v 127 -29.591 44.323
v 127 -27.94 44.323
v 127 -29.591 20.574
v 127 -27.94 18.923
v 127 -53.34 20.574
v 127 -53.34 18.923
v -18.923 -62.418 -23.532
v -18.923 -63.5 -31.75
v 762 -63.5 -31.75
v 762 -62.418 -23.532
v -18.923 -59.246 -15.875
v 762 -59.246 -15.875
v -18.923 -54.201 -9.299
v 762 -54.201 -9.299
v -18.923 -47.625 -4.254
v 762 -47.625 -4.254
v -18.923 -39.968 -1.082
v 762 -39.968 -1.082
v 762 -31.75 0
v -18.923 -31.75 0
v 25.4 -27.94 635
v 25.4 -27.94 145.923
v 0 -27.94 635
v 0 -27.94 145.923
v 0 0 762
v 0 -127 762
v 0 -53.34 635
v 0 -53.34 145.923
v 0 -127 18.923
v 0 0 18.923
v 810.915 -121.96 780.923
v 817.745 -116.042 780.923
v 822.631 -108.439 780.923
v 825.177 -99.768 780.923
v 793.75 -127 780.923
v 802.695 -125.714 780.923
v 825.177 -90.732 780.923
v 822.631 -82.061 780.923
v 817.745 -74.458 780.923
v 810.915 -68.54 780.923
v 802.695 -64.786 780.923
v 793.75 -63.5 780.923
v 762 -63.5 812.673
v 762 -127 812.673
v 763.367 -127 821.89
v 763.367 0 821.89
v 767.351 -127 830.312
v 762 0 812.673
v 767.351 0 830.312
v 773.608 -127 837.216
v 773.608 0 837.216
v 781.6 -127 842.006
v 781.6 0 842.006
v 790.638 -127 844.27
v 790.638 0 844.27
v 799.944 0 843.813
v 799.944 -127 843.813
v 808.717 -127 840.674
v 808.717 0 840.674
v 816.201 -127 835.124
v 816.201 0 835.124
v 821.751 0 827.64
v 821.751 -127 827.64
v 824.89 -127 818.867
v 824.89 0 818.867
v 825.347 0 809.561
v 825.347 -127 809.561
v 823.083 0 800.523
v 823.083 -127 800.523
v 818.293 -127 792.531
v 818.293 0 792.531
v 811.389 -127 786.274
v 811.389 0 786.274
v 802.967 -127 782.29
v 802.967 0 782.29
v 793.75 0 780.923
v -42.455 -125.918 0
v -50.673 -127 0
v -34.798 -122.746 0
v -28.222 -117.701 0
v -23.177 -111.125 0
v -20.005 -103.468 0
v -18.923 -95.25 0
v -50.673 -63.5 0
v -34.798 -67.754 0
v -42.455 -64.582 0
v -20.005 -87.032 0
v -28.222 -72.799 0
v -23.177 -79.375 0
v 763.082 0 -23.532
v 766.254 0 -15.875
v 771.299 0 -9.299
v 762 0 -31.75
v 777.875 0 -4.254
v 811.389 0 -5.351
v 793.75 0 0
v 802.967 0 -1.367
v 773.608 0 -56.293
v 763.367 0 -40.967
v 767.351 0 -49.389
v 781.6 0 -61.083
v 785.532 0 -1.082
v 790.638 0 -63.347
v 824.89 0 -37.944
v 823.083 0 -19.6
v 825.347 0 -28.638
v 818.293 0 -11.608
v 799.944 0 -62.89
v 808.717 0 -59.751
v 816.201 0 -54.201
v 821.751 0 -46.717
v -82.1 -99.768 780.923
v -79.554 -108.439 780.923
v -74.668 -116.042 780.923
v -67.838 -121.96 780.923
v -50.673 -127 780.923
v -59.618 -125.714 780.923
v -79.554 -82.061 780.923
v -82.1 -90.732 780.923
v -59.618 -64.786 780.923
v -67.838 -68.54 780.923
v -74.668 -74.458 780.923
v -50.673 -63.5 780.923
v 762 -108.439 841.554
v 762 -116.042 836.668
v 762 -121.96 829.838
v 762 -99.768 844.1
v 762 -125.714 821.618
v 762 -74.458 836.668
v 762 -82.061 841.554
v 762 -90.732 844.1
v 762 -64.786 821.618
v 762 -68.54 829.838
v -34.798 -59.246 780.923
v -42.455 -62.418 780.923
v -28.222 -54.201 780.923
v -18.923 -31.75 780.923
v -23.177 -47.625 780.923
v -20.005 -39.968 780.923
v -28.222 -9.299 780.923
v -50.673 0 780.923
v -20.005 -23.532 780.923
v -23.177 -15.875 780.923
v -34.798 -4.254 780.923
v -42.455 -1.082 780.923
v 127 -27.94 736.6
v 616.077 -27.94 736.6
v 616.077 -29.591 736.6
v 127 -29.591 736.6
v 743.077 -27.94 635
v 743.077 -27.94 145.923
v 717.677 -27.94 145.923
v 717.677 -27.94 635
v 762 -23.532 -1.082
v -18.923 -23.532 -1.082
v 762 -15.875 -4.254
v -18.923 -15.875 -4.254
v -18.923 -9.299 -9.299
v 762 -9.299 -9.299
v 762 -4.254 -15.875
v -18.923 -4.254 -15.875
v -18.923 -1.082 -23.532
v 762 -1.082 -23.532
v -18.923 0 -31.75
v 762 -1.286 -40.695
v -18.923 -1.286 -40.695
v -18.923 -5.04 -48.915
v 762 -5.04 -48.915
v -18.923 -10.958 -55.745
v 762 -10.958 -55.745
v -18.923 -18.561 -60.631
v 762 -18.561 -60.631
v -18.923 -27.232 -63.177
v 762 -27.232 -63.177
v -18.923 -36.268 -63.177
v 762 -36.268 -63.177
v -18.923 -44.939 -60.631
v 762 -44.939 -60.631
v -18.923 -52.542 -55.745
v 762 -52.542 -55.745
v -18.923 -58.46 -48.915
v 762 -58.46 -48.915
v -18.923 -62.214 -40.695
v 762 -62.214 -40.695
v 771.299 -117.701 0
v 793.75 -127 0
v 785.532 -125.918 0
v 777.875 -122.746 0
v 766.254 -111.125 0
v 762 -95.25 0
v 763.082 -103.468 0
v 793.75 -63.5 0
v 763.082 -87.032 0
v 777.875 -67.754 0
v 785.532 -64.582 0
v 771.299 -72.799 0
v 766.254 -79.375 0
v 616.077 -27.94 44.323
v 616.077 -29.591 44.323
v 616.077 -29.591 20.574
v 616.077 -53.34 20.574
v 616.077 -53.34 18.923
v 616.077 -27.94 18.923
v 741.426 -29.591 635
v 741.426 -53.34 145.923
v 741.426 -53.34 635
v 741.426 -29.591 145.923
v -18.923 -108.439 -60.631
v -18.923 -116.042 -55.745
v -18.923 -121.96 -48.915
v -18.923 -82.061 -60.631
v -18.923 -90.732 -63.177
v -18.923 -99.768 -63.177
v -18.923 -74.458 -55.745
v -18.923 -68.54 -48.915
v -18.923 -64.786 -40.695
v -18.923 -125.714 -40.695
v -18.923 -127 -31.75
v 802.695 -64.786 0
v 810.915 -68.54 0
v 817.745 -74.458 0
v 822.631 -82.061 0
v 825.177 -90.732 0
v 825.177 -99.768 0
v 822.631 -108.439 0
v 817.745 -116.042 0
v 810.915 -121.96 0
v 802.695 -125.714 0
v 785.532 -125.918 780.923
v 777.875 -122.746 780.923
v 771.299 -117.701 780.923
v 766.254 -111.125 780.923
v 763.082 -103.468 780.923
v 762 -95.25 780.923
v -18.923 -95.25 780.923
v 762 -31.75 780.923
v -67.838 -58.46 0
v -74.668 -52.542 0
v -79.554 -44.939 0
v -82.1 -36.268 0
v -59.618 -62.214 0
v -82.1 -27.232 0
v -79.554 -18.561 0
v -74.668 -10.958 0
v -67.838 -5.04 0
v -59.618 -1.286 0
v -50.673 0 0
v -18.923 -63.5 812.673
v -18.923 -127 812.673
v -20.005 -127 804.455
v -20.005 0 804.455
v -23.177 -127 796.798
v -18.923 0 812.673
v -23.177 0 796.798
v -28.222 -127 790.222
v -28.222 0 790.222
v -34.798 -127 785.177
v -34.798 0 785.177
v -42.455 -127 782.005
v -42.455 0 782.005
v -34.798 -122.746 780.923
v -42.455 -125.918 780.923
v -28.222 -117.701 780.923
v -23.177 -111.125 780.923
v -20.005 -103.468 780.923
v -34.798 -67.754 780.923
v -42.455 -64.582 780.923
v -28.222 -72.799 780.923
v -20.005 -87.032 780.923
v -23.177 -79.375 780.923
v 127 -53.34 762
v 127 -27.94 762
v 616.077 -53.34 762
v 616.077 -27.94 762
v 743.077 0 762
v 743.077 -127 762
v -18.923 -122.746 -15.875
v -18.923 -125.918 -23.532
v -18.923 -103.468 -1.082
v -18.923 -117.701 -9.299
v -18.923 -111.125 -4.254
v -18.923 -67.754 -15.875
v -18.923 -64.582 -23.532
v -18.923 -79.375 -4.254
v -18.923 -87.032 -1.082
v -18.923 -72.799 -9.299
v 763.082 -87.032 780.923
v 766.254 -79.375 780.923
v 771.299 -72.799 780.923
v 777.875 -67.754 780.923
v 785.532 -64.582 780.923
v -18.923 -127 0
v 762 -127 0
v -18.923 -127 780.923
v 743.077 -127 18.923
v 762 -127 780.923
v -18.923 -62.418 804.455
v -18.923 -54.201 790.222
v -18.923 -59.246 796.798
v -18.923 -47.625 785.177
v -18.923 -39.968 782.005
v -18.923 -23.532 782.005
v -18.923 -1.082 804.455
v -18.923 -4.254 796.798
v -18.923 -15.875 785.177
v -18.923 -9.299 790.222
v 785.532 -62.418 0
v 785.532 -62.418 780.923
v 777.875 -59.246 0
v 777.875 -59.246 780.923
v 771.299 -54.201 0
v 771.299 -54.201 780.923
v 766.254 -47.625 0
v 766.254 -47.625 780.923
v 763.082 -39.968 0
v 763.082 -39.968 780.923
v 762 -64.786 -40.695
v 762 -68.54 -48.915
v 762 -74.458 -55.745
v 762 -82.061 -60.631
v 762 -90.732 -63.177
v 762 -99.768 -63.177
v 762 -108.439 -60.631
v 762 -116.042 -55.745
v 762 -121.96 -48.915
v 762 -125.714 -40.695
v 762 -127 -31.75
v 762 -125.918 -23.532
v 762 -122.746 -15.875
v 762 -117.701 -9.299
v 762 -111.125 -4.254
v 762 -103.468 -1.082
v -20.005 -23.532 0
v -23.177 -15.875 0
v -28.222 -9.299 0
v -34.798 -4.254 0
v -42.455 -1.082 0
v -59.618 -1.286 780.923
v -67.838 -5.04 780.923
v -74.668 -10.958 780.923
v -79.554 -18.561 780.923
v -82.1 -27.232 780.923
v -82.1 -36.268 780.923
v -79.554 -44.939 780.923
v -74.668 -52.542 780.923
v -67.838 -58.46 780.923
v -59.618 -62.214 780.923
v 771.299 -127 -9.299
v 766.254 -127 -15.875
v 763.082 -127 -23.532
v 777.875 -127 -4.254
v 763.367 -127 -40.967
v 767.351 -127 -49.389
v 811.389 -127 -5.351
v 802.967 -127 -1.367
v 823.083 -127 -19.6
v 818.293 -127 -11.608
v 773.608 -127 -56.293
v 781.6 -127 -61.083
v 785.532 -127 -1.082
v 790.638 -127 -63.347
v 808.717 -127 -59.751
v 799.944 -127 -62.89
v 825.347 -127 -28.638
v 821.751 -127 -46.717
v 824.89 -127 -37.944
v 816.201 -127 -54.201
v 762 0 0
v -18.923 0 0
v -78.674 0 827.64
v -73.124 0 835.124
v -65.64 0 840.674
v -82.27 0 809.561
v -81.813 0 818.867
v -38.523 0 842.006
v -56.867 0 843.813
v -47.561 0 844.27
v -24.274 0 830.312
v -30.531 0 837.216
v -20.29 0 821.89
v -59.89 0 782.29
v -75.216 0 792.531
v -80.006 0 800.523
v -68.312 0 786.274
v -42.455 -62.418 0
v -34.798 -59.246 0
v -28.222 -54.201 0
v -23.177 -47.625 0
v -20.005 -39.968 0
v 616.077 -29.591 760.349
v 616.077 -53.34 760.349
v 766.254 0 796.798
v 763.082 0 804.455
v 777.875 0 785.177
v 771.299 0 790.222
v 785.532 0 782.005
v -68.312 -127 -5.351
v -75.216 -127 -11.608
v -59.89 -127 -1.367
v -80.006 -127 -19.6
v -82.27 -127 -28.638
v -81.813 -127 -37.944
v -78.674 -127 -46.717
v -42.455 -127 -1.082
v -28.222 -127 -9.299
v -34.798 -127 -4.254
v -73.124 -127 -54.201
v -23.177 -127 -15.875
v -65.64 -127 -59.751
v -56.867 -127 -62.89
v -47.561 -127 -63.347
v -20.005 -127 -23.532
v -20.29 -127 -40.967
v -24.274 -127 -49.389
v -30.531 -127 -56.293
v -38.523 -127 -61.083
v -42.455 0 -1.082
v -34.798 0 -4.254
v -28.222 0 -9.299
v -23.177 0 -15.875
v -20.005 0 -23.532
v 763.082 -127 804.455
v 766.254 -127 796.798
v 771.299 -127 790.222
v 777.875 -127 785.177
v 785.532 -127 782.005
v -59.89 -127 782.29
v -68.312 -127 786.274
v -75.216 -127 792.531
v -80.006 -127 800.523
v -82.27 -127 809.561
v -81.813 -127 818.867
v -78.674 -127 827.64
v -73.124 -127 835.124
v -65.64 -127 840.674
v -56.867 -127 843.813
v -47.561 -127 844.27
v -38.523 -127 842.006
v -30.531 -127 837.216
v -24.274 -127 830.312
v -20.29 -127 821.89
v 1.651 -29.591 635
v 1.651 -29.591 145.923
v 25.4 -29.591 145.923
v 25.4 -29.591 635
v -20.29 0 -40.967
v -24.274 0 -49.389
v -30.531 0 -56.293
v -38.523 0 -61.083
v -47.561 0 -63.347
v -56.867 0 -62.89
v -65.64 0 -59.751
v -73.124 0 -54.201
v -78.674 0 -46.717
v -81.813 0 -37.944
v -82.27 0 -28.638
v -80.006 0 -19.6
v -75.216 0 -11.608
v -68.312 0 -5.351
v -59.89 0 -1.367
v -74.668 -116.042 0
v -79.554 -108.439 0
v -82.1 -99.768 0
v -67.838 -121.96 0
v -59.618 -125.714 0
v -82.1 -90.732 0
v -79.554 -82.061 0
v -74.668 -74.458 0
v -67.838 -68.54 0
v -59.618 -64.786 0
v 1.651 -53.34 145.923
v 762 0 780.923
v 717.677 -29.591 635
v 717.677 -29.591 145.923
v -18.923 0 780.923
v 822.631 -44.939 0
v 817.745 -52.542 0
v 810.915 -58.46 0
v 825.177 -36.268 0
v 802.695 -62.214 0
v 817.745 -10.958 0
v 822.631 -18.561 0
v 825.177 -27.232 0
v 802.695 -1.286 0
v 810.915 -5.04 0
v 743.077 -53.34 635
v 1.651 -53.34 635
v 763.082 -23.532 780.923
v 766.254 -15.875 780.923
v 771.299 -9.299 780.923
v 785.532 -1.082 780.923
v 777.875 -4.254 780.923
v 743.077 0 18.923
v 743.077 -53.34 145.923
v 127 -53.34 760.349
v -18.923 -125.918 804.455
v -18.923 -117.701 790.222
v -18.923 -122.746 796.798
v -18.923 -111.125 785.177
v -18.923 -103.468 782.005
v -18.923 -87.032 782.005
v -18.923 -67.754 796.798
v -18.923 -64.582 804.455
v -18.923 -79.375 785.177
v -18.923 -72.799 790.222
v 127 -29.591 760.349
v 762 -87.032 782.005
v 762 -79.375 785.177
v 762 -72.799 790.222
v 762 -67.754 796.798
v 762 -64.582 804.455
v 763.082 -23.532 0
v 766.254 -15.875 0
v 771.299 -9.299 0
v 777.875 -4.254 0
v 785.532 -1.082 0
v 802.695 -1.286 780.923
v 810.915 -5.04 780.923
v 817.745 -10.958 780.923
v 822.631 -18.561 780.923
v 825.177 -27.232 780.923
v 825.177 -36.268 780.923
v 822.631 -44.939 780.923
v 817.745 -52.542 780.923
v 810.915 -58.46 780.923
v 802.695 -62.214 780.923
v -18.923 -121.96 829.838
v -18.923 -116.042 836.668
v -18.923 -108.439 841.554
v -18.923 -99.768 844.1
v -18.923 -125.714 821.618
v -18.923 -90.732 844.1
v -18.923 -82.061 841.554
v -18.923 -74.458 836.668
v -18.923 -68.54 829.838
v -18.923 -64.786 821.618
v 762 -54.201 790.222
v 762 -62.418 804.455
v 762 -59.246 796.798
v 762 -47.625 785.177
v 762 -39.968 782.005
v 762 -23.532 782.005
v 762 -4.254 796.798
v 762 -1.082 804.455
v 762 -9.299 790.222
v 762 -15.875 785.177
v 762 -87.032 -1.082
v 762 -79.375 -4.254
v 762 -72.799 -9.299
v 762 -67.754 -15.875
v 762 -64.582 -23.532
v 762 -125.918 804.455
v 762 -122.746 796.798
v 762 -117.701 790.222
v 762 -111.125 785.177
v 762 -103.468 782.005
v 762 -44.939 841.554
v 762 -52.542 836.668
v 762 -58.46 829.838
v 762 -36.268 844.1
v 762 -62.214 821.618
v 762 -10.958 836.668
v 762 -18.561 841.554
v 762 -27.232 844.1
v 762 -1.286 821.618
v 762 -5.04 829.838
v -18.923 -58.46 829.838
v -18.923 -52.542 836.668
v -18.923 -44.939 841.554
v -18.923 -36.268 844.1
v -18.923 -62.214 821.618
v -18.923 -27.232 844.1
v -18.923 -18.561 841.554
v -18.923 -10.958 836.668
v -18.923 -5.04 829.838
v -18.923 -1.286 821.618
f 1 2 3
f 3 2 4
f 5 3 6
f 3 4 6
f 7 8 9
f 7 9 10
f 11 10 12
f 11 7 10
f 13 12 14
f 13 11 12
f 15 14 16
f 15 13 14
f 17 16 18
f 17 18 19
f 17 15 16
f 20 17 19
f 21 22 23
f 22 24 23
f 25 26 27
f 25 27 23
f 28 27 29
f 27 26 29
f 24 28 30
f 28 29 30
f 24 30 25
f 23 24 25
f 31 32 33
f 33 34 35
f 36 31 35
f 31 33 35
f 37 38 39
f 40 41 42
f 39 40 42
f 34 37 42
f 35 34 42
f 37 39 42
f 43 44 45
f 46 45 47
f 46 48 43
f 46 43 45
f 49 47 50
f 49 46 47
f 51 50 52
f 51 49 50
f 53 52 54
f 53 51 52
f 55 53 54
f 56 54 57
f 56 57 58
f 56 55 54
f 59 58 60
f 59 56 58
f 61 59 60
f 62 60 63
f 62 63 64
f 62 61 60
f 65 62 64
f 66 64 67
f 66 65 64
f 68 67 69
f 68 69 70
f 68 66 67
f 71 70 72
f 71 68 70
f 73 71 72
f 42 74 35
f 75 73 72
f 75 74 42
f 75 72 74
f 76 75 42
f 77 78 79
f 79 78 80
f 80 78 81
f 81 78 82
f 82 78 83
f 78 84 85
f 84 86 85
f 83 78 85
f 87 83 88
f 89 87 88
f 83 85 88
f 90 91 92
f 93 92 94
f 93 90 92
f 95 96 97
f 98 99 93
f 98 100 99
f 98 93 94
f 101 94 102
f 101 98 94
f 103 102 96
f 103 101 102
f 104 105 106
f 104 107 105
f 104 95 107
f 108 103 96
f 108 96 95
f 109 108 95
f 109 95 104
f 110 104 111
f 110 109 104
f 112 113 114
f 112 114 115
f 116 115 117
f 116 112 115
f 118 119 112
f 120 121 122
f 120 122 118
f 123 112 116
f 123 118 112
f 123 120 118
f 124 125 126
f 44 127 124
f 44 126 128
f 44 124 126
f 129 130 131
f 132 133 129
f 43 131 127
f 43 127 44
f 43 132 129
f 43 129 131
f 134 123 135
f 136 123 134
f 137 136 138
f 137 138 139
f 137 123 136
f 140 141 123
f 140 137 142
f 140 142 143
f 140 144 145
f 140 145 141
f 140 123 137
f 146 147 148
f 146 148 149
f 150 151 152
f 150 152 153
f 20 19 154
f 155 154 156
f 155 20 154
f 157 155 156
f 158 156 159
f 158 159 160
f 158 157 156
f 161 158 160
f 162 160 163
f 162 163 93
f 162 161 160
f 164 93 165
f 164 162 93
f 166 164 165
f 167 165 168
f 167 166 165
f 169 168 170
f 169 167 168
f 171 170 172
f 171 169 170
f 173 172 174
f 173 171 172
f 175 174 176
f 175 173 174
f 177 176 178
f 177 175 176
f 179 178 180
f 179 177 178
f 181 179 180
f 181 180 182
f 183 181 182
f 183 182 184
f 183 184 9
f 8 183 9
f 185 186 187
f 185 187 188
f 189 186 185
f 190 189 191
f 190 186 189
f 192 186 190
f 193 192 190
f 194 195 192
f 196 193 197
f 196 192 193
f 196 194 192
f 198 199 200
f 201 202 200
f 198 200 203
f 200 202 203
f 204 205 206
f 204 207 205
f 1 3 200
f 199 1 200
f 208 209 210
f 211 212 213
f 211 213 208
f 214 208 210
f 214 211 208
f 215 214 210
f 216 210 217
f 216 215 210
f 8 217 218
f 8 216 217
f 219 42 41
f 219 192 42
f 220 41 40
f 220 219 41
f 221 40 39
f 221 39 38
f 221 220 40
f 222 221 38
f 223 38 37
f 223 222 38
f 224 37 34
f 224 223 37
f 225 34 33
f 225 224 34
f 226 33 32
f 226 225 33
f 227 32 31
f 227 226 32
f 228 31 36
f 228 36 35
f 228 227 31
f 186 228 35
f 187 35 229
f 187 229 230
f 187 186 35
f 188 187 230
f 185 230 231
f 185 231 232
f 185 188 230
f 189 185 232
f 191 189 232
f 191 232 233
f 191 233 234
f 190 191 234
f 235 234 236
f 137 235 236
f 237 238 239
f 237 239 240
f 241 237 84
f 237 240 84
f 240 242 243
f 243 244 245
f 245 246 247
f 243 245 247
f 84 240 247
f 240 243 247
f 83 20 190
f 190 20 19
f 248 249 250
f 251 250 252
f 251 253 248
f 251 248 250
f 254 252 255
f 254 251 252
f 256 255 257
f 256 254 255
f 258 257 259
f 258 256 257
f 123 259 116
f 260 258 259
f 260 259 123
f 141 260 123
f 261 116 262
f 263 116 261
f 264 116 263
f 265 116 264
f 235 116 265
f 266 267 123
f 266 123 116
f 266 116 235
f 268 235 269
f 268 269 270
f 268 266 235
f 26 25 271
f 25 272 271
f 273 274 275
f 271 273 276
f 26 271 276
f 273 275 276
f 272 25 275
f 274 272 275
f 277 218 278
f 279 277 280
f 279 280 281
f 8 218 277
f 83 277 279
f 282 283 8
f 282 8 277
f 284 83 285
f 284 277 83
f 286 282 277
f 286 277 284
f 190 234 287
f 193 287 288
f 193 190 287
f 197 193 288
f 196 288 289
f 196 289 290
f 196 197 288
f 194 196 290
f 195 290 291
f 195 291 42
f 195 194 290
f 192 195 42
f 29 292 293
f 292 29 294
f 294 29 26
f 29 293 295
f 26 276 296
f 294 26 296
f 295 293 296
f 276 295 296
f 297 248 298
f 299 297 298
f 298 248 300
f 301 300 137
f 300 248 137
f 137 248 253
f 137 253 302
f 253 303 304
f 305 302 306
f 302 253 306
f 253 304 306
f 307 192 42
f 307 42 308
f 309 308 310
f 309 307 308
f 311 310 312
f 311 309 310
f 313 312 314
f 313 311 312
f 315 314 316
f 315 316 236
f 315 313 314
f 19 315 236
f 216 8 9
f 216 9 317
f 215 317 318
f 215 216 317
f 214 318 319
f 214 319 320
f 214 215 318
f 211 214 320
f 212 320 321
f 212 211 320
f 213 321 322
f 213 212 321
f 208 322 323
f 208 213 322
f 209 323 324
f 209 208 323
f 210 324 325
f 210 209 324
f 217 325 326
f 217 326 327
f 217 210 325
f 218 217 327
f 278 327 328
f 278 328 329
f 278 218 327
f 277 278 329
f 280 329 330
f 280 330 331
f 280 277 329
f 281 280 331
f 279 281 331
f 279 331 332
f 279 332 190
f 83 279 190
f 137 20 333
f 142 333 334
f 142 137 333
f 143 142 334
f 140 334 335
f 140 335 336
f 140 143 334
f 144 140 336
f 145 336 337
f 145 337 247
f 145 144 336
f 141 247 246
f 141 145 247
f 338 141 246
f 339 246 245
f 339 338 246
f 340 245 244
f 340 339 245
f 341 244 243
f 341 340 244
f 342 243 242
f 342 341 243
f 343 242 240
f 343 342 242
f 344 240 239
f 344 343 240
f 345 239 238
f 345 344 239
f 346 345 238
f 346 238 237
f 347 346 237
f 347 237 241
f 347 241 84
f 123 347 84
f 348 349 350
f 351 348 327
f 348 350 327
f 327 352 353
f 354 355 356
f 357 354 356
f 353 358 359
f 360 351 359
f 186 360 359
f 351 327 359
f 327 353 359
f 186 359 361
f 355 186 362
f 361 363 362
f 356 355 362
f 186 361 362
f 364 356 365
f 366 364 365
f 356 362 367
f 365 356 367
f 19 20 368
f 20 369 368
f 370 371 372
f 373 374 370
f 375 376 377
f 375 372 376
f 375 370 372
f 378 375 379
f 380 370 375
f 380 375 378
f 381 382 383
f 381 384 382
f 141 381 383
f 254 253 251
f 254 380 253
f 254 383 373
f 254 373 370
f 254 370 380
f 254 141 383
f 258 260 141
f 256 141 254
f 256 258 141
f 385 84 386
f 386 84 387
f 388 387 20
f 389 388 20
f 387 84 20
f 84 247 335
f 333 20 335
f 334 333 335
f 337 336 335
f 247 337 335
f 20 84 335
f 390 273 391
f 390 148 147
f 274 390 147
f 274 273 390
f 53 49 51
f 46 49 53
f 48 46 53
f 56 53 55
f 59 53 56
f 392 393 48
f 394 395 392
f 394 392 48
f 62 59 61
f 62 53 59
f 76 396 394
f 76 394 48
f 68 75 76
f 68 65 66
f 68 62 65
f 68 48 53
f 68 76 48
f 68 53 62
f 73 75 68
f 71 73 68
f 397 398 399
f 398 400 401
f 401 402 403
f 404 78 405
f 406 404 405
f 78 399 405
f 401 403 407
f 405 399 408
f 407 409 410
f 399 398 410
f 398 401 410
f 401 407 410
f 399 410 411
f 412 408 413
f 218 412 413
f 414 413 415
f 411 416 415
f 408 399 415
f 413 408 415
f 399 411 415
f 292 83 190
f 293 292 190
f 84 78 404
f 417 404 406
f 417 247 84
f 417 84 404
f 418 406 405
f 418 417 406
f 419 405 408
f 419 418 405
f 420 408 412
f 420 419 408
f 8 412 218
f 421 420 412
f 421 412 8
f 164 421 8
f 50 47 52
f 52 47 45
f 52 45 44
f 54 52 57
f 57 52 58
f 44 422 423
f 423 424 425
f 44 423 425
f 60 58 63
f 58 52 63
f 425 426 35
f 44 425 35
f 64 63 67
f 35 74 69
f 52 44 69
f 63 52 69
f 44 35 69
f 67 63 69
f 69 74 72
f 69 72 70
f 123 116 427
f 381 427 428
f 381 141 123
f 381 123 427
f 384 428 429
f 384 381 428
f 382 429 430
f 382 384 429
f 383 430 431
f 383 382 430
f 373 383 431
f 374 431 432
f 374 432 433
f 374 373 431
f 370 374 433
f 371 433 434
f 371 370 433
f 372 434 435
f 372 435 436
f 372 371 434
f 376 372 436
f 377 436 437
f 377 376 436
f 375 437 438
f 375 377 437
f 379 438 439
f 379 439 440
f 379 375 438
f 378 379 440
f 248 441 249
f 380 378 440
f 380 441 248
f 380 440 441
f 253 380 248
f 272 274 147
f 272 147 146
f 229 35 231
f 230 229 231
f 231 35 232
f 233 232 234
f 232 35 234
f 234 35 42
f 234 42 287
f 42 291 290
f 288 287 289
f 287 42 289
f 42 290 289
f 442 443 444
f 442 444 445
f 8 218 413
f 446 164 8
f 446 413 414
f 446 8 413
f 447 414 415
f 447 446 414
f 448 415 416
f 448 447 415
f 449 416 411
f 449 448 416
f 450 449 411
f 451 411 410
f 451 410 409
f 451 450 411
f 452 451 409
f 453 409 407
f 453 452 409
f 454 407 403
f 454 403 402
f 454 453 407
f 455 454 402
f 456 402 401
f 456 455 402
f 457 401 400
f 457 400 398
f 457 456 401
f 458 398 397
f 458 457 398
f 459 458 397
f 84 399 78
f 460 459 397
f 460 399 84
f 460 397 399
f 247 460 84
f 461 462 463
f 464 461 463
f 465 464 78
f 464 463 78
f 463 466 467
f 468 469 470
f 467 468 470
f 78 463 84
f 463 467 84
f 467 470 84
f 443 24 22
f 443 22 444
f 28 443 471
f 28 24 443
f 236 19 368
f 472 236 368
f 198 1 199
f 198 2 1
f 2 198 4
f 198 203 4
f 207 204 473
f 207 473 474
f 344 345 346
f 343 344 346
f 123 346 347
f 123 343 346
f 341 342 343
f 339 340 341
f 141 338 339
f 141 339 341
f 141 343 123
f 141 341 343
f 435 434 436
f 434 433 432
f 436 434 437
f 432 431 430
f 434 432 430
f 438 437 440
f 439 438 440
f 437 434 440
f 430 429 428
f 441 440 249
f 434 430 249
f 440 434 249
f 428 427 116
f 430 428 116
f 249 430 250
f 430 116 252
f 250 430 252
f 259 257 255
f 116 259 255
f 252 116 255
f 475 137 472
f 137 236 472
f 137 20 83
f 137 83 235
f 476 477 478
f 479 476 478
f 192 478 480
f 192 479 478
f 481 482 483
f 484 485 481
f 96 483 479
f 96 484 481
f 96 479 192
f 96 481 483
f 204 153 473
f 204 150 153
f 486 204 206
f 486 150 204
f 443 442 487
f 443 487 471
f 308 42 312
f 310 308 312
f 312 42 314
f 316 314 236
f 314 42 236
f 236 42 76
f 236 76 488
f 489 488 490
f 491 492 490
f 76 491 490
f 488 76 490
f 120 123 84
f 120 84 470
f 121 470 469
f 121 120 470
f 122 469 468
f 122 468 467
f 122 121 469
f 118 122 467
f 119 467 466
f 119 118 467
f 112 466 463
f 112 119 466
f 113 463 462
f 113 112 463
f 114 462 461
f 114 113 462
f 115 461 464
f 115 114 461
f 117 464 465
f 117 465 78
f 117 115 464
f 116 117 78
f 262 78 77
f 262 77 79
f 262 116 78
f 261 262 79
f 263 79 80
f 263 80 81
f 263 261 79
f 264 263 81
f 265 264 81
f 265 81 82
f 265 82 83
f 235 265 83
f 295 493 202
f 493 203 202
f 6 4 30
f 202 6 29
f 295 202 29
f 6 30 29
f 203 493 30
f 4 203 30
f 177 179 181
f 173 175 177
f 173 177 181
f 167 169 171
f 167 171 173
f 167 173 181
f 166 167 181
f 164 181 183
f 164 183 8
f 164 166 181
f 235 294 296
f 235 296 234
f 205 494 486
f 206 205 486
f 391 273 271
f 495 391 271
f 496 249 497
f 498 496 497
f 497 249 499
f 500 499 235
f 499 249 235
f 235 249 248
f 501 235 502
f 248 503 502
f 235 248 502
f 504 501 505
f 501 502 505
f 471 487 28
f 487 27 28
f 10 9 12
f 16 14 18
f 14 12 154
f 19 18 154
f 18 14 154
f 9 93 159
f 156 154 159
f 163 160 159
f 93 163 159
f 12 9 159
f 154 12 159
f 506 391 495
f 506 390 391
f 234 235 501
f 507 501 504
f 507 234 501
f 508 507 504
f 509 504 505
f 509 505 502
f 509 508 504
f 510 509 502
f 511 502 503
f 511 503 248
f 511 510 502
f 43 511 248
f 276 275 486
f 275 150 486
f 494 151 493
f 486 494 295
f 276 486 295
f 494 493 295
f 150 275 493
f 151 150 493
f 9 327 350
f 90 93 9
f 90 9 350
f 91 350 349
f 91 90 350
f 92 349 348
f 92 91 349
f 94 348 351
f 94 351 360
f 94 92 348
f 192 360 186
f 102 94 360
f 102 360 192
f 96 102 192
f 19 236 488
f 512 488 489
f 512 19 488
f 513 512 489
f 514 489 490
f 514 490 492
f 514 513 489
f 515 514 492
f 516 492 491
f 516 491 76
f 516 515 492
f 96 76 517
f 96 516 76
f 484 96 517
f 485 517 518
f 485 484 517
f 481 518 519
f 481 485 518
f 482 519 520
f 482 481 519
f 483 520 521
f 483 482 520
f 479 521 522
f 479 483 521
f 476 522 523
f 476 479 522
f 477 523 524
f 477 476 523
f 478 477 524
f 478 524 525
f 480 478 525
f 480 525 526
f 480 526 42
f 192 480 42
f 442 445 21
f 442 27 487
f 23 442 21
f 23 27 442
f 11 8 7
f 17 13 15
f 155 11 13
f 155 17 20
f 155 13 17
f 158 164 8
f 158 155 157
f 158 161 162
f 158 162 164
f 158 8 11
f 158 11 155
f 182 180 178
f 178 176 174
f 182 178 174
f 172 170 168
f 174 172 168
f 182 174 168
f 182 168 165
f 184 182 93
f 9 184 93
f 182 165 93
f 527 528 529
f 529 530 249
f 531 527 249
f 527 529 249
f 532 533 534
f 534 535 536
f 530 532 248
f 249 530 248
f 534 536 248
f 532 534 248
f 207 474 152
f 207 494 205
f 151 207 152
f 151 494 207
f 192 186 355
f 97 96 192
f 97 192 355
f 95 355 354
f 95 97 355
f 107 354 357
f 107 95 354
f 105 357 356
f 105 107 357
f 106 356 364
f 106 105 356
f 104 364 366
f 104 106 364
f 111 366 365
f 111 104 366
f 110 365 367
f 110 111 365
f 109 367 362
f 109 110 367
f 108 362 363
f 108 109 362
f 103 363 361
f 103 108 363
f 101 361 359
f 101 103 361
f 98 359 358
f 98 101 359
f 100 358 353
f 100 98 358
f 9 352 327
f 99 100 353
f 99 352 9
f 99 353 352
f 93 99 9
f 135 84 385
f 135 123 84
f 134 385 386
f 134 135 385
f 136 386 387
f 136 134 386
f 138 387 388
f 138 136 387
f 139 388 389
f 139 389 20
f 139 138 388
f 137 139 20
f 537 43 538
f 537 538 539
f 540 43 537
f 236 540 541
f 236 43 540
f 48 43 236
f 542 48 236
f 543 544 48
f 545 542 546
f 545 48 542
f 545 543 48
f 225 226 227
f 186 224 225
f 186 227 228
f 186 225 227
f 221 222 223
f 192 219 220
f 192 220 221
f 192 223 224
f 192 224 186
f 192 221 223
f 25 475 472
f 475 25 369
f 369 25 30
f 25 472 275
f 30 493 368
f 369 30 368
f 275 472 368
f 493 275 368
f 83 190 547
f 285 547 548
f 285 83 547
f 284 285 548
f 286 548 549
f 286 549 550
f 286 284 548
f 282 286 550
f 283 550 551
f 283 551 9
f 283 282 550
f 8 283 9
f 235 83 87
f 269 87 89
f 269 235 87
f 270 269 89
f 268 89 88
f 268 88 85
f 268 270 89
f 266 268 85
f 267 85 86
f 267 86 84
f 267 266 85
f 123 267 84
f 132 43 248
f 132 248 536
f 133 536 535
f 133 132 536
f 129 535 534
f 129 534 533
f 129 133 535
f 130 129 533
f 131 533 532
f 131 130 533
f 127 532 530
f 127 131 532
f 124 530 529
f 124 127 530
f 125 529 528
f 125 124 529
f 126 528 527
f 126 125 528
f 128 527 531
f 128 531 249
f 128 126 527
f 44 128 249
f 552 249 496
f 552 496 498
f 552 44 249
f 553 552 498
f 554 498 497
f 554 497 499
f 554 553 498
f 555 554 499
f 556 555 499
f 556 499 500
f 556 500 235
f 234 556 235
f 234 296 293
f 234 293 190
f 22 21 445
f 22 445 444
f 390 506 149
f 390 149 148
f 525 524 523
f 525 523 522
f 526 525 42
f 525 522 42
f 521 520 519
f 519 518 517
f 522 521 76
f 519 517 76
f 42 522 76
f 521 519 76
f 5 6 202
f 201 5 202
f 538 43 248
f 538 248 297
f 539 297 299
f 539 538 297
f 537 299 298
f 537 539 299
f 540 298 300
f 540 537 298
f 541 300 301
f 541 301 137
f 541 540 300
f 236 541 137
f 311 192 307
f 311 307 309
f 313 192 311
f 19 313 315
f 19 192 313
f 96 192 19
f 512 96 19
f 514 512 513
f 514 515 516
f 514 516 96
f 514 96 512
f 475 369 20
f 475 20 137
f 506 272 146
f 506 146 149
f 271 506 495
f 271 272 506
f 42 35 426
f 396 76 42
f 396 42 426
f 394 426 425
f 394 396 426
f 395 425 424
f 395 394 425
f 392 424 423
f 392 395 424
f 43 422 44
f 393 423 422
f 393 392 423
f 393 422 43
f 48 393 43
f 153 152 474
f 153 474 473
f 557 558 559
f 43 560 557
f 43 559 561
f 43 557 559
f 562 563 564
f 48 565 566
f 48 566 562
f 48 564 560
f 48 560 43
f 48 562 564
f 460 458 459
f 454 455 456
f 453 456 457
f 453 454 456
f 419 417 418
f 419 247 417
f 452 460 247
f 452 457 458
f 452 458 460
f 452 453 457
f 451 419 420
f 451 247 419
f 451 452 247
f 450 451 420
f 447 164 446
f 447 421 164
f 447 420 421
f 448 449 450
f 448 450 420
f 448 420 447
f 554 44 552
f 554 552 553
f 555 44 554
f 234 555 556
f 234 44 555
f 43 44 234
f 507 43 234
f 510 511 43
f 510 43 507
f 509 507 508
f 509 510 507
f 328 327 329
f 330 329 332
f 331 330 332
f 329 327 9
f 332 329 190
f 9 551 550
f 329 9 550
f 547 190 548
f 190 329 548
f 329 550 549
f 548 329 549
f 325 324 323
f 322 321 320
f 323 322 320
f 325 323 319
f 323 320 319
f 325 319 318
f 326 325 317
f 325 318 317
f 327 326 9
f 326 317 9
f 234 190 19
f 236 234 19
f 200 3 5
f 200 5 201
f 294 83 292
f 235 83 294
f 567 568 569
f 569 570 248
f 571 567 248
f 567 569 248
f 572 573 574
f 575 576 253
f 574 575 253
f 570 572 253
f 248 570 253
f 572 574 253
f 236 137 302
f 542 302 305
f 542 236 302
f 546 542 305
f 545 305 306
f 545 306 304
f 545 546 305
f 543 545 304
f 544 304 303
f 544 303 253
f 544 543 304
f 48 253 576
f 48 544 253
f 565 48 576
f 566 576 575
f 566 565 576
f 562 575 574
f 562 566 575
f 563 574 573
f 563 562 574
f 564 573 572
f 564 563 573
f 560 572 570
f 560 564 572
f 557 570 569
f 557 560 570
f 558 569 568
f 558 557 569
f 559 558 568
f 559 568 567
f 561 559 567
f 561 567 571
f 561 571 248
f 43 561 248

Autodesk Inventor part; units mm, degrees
ref_plane "YZ Plane" through (0, 0, 0) normal (1, 0, 0) x (0, 1, 0)
ref_plane "XZ Plane" through (0, 0, 0) normal (0, 1, 0) x (-1, 0, 0)
ref_plane "XY Plane" through (0, 0, 0) normal (0, 0, 1) x (1, 0, 0)
sketch "Sketch1" plane through (0, 0, 0) normal (0, 0, 1) x (1, 0, 0)
  line L0 (0, 0) -> (-18.923, 0)
  line L1 (-18.923, 0) -> (-18.923, -127)
  line L2 (-18.923, -127) -> (0, -127)
  line L3 (0, -127) -> (0, 0)
  dimension "d0" = 127
  dimension "d1" = 18.923
extrude "Extrusion1" add sketch "Sketch1" along normal blind 762
sketch "Sketch2" plane through (0, -127, 0) normal (1, 0, 0) x (0, 0, -1)
  line L0 (0, 127) -> (0, 0) projected
  line L1 (0, 127) -> (-18.923, 127)
  line L2 (-18.923, 127) -> (-18.923, 0)
  line L3 (-18.923, 0) -> (0, 0)
  line L4 (0, 0) -> (0, 127)
  dimension "d4" = 18.923
  dimension "d21" = 127
extrude "Extrusion2" add sketch "Sketch2" along normal blind 762
sketch "Sketch3" plane through (0, -139.7, 18.923) normal (0, 0, 1) x (1, 0, 0)
  line L0 (762, 139.7) -> (-18.923, 139.7) projected
  line L1 (762, 139.7) -> (743.077, 139.7)
  line L2 (743.077, 139.7) -> (743.077, 12.7)
  line L3 (743.077, 12.7) -> (762, 12.7)
  line L4 (762, 12.7) -> (762, 139.7)
  line L5 (0, 12.7) -> (762, 12.7) projected
  point P0 (0, 139.7)
  dimension "d8" = 18.923
extrude "Extrusion3" add sketch "Sketch3" along normal blind 762
sketch "Sketch4" plane through (743.077, -127, 18.923) normal (-1, 0, 0) x (0, 0, 1)
  line L0 (762, 0) -> (762, 127) projected
  line L1 (762, 127) -> (743.077, 127)
  line L2 (743.077, 127) -> (743.077, 0)
  line L3 (743.077, 0) -> (762, 0)
  line L4 (762, 0) -> (762, 127)
  line L5 (0, 0) -> (762, 0) projected
  point P0 (-18.923, 127)
  dimension "d11" = 18.923
  dimension "d12" = 0
extrude "Extrusion4" add sketch "Sketch4" along normal blind 762
sketch "Sketch8" plane through (0, -139.7, 780.923) normal (0, 0, 1) x (1, 0, 0)
  circle A0 centre (-50.673, 107.95) radius 31.75
  circle A1 centre (-50.673, 44.45) radius 31.75
  line L0 (762, 12.7) -> (-18.923, 12.7) projected
  line L1 (762, 139.7) -> (-18.923, 139.7) projected
  line L2 (-18.923, 12.7) -> (-18.923, 139.7) projected
  point P0 (0, 139.7)
  dimension "d32" = 63.5
  dimension "d33" = 63.5
  dimension "d35" = 31.75
  dimension "d36" = 31.75
  dimension "d37" = 31.75
  dimension "d38" = 31.75
extrude "Extrusion7" add sketch "Sketch8" against normal blind 780.923 contours A0 | A1
sketch "Sketch10" plane through (-18.923, 0, 0) normal (-1, 0, 0) x (0, 0, 1)
  circle A0 centre (-31.75, -31.75) radius 31.75
  circle A1 centre (-31.75, -95.25) radius 31.75
  line L0 (0, 0) -> (0, -31.75) projected
  line L1 (0, 0) -> (780.923, 0) projected
  line L2 (0, 0) -> (0, -31.75) projected
  point P0 (0, -127)
  point P1 (0, -95.25)
  dimension "d41" = 63.5
  dimension "d42" = 63.5
  dimension "d43" = 31.75
  dimension "d44" = 31.75
  dimension "d45" = 31.75
  dimension "d46" = 31.75
  dimension "d47" = 31.75
extrude "Extrusion8" add sketch "Sketch10" against normal blind 780.923
sketch "Sketch12" plane through (0, 0, 0) normal (0, 0, -1) x (-1, 0, 0)
  circle A0 centre (-793.75, -31.75) radius 31.75
  circle A1 centre (-793.75, -95.25) radius 31.75
  line L0 (-762, -63.5) -> (-762, -127) projected
  line L1 (-762, 0) -> (-762, -63.5) projected
  line L2 (-762, 0) -> (18.923, 0) projected
  line L3 (18.923, -127) -> (-762, -127) projected
  point P0 (0, 0)
  point P1 (-762, -95.25)
  point P2 (-762, -31.75)
  dimension "d50" = 63.5
  dimension "d51" = 63.5
  dimension "d52" = 31.75
  dimension "d53" = 31.75
  dimension "d54" = 31.75
  dimension "d55" = 31.75
extrude "Extrusion9" add sketch "Sketch12" against normal blind 780.923 contours A0 | A1
sketch "Sketch13" plane through (762, -127, 0) normal (1, 0, 0) x (0, 0, -1)
  circle A0 centre (-812.673, 95.25) radius 31.75
  circle A1 centre (-812.673, 31.75) radius 31.75
  line L0 (0, 127) -> (-780.923, 127) projected
  line L1 (-780.923, 127) -> (-780.923, 63.5) projected
  line L2 (-780.923, 63.5) -> (-780.923, 0) projected
  point P0 (0, 0)
  point P1 (-762, -95.25)
  point P2 (-762, -31.75)
  point P3 (-780.923, 95.25)
  point P4 (-780.923, 31.75)
  dimension "d58" = 63.5
  dimension "d59" = 63.5
  dimension "d64" = 63.5
  dimension "d65" = 31.75
  dimension "d66" = 31.75
  dimension "d67" = 31.75
extrude "Extrusion10" add sketch "Sketch13" against normal blind 780.923 contours A0 | A1
sketch "Sketch14" plane through (-18.923, 0, 0) normal (0, 1, 0) x (1, 0, 0)
  line L0 (780.923, 0) -> (812.673, 0) projected
  circle A0 centre (812.673, 31.75) radius 31.75
  line L1 (780.923, 0) -> (844.423, 0) projected
  line L2 (780.923, 0) -> (780.923, 63.5) projected
  circle A1 centre (-31.75, 31.75) radius 31.75
  line L3 (0, 0) -> (0, 63.5) projected
  line L4 (0, 0) -> (-63.5, 0) projected
  circle A2 centre (-31.75, -812.673) radius 31.75
  line L5 (0, -780.923) -> (-63.5, -780.923) projected
  line L6 (0, -780.923) -> (0, -844.423) projected
  circle A3 centre (812.673, -812.673) radius 31.75
  line L7 (780.923, -780.923) -> (844.423, -780.923) projected
  line L8 (780.923, -780.923) -> (780.923, -844.423) projected
  point P0 (18.923, 0)
  point P1 (780.923, 31.75)
  point P2 (0, 31.75)
  point P3 (-31.75, 0)
  point P4 (-31.75, -780.923)
  point P5 (0, -812.673)
  point P6 (812.673, -780.923)
  point P7 (780.923, -812.673)
  dimension "d73" = 63.5
  dimension "d76" = 63.5
  dimension "d70" = 31.75
  dimension "d71" = 63.5
  dimension "d72" = 31.75
  dimension "d74" = 31.75
  dimension "d75" = 31.75
  dimension "d77" = 31.75
  dimension "d78" = 31.75
  dimension "d79" = 63.5
  dimension "d80" = 31.75
  dimension "d81" = 31.75
extrude "Extrusion11" add sketch "Sketch14" against normal blind 127 contours A0 | A1 | A2 | A3
sketch "Sketch15" plane through (0, -127, 18.923) normal (1, 0, 0) x (0, 0, -1)
  line L0 (0, 0) -> (0, 127) projected
  line L1 (-743.077, 0) -> (-743.077, 127) projected
  line L2 (0, 0) -> (-743.077, 0) projected
  line L3 (18.923, 0) -> (-762, 0) projected
  line L4 (-616.077, 73.66) -> (-127, 73.66)
  line L5 (-127, 73.66) -> (-127, 99.06)
  line L6 (-127, 99.06) -> (-616.077, 99.06)
  line L7 (-616.077, 99.06) -> (-616.077, 73.66)
  point P0 (18.923, 127)
  point P1 (-127, 0)
  point P2 (-590.677, 0)
  point P3 (-152.4, 0)
  point P4 (-336.677, 0)
  point P5 (-762, 0)
  dimension "d99" = 25.4
  dimension "d100" = 73.66
  dimension "d101" = 127
  dimension "d102" = 127
extrude "Extrusion15" add sketch "Sketch15" along normal blind 1.651
sketch "Sketch17" plane through (1.651, -127, 18.923) normal (1, 0, 0) x (0, 0, -1)
  line L0 (-127, 99.06) -> (-616.077, 99.06) projected
  line L1 (-127, 99.06) -> (-127, 73.66) projected
  line L2 (-616.077, 99.06) -> (-127, 99.06)
  line L3 (-127, 99.06) -> (-127, 97.409)
  line L4 (-127, 97.409) -> (-616.077, 97.409)
  line L5 (-616.077, 97.409) -> (-616.077, 99.06)
  point P0 (18.923, 127)
  dimension "d105" = 1.651
extrude "Extrusion16" add sketch "Sketch17" along normal blind 23.749
sketch "Sketch20" plane through (743.077, -127, 762) normal (0, 0, -1) x (-1, 0, 0)
  line L0 (127, 73.66) -> (616.077, 73.66)
  line L1 (616.077, 73.66) -> (616.077, 99.06)
  line L2 (616.077, 99.06) -> (127, 99.06)
  line L3 (127, 99.06) -> (127, 73.66)
  line L4 (0, 0) -> (743.077, 0) projected
  line L5 (743.077, 0) -> (743.077, 127) projected
  line L6 (0, 0) -> (0, 127) projected
  dimension "d115" = 25.4
  dimension "d116" = 73.66
  dimension "d117" = 127
  dimension "d118" = 489.077
  dimension "d119" = 127
extrude "Extrusion19" add sketch "Sketch20" along normal blind 1.651
sketch "Sketch21" plane through (743.077, -127, 18.923) normal (-1, 0, 0) x (0, 0, 1)
  line L0 (127, 73.66) -> (616.077, 73.66)
  line L1 (616.077, 73.66) -> (616.077, 99.06)
  line L2 (616.077, 99.06) -> (127, 99.06)
  line L3 (127, 99.06) -> (127, 73.66)
  line L4 (0, 0) -> (743.077, 0)
  line L5 (743.077, 0) -> (743.077, 127)
  line L6 (0, 0) -> (0, 127)
  dimension "d123" = 25.4
  dimension "d124" = 73.66
  dimension "d122" = 127
  dimension "d125" = 489.077
  dimension "d129" = 127
extrude "Extrusion20" add sketch "Sketch21" along normal blind 1.651
sketch "Sketch22" plane through (0, -127, 18.923) normal (0, 0, 1) x (1, 0, 0)
  line L0 (127, 73.66) -> (616.077, 73.66)
  line L1 (616.077, 73.66) -> (616.077, 99.06)
  line L2 (616.077, 99.06) -> (127, 99.06)
  line L3 (127, 99.06) -> (127, 73.66)
  line L4 (0, 0) -> (743.077, 0)
  line L5 (743.077, 0) -> (743.077, 127)
  line L6 (0, 0) -> (0, 127)
  dimension "d131" = 25.4
  dimension "d132" = 73.66
  dimension "d130" = 127
  dimension "d133" = 489.077
  dimension "d137" = 127
extrude "Extrusion21" add sketch "Sketch22" along normal blind 1.651
sketch "Sketch23" plane through (0, -127, 20.574) normal (0, 0, 1) x (1, 0, 0)
  line L0 (616.077, 99.06) -> (127, 99.06) projected
  line L1 (616.077, 99.06) -> (127, 99.06)
  line L2 (127, 99.06) -> (127, 97.409)
  line L3 (127, 97.409) -> (616.077, 97.409)
  line L4 (616.077, 97.409) -> (616.077, 99.06)
  point P0 (0, 127)
  dimension "d138" = 1.651
extrude "Extrusion22" add sketch "Sketch23" along normal blind 23.749
sketch "Sketch24" plane through (743.077, -127, 760.349) normal (0, 0, -1) x (-1, 0, 0)
  line L0 (127, 99.06) -> (616.077, 99.06)
  line L1 (616.077, 99.06) -> (616.077, 97.409)
  line L2 (616.077, 97.409) -> (127, 97.409)
  line L3 (127, 97.409) -> (127, 99.06)
  point P0 (743.077, 127)
  dimension "d141" = 1.651
extrude "Extrusion23" add sketch "Sketch24" along normal blind 23.749
sketch "Sketch26" plane through (741.426, -127, 18.923) normal (-1, 0, 0) x (0, 0, 1)
  line L0 (127, 73.66) -> (127, 99.06) projected
  line L1 (616.077, 99.06) -> (616.077, 73.66) projected
  line L2 (127, 99.06) -> (616.077, 99.06)
  line L3 (616.077, 99.06) -> (616.077, 97.409)
  line L4 (616.077, 97.409) -> (127, 97.409)
  line L5 (127, 97.409) -> (127, 99.06)
  point P0 (-18.923, 127)
  dimension "d144" = 1.651
extrude "Extrusion24" add sketch "Sketch26" along normal blind 23.749
properties part number "bumpers"
